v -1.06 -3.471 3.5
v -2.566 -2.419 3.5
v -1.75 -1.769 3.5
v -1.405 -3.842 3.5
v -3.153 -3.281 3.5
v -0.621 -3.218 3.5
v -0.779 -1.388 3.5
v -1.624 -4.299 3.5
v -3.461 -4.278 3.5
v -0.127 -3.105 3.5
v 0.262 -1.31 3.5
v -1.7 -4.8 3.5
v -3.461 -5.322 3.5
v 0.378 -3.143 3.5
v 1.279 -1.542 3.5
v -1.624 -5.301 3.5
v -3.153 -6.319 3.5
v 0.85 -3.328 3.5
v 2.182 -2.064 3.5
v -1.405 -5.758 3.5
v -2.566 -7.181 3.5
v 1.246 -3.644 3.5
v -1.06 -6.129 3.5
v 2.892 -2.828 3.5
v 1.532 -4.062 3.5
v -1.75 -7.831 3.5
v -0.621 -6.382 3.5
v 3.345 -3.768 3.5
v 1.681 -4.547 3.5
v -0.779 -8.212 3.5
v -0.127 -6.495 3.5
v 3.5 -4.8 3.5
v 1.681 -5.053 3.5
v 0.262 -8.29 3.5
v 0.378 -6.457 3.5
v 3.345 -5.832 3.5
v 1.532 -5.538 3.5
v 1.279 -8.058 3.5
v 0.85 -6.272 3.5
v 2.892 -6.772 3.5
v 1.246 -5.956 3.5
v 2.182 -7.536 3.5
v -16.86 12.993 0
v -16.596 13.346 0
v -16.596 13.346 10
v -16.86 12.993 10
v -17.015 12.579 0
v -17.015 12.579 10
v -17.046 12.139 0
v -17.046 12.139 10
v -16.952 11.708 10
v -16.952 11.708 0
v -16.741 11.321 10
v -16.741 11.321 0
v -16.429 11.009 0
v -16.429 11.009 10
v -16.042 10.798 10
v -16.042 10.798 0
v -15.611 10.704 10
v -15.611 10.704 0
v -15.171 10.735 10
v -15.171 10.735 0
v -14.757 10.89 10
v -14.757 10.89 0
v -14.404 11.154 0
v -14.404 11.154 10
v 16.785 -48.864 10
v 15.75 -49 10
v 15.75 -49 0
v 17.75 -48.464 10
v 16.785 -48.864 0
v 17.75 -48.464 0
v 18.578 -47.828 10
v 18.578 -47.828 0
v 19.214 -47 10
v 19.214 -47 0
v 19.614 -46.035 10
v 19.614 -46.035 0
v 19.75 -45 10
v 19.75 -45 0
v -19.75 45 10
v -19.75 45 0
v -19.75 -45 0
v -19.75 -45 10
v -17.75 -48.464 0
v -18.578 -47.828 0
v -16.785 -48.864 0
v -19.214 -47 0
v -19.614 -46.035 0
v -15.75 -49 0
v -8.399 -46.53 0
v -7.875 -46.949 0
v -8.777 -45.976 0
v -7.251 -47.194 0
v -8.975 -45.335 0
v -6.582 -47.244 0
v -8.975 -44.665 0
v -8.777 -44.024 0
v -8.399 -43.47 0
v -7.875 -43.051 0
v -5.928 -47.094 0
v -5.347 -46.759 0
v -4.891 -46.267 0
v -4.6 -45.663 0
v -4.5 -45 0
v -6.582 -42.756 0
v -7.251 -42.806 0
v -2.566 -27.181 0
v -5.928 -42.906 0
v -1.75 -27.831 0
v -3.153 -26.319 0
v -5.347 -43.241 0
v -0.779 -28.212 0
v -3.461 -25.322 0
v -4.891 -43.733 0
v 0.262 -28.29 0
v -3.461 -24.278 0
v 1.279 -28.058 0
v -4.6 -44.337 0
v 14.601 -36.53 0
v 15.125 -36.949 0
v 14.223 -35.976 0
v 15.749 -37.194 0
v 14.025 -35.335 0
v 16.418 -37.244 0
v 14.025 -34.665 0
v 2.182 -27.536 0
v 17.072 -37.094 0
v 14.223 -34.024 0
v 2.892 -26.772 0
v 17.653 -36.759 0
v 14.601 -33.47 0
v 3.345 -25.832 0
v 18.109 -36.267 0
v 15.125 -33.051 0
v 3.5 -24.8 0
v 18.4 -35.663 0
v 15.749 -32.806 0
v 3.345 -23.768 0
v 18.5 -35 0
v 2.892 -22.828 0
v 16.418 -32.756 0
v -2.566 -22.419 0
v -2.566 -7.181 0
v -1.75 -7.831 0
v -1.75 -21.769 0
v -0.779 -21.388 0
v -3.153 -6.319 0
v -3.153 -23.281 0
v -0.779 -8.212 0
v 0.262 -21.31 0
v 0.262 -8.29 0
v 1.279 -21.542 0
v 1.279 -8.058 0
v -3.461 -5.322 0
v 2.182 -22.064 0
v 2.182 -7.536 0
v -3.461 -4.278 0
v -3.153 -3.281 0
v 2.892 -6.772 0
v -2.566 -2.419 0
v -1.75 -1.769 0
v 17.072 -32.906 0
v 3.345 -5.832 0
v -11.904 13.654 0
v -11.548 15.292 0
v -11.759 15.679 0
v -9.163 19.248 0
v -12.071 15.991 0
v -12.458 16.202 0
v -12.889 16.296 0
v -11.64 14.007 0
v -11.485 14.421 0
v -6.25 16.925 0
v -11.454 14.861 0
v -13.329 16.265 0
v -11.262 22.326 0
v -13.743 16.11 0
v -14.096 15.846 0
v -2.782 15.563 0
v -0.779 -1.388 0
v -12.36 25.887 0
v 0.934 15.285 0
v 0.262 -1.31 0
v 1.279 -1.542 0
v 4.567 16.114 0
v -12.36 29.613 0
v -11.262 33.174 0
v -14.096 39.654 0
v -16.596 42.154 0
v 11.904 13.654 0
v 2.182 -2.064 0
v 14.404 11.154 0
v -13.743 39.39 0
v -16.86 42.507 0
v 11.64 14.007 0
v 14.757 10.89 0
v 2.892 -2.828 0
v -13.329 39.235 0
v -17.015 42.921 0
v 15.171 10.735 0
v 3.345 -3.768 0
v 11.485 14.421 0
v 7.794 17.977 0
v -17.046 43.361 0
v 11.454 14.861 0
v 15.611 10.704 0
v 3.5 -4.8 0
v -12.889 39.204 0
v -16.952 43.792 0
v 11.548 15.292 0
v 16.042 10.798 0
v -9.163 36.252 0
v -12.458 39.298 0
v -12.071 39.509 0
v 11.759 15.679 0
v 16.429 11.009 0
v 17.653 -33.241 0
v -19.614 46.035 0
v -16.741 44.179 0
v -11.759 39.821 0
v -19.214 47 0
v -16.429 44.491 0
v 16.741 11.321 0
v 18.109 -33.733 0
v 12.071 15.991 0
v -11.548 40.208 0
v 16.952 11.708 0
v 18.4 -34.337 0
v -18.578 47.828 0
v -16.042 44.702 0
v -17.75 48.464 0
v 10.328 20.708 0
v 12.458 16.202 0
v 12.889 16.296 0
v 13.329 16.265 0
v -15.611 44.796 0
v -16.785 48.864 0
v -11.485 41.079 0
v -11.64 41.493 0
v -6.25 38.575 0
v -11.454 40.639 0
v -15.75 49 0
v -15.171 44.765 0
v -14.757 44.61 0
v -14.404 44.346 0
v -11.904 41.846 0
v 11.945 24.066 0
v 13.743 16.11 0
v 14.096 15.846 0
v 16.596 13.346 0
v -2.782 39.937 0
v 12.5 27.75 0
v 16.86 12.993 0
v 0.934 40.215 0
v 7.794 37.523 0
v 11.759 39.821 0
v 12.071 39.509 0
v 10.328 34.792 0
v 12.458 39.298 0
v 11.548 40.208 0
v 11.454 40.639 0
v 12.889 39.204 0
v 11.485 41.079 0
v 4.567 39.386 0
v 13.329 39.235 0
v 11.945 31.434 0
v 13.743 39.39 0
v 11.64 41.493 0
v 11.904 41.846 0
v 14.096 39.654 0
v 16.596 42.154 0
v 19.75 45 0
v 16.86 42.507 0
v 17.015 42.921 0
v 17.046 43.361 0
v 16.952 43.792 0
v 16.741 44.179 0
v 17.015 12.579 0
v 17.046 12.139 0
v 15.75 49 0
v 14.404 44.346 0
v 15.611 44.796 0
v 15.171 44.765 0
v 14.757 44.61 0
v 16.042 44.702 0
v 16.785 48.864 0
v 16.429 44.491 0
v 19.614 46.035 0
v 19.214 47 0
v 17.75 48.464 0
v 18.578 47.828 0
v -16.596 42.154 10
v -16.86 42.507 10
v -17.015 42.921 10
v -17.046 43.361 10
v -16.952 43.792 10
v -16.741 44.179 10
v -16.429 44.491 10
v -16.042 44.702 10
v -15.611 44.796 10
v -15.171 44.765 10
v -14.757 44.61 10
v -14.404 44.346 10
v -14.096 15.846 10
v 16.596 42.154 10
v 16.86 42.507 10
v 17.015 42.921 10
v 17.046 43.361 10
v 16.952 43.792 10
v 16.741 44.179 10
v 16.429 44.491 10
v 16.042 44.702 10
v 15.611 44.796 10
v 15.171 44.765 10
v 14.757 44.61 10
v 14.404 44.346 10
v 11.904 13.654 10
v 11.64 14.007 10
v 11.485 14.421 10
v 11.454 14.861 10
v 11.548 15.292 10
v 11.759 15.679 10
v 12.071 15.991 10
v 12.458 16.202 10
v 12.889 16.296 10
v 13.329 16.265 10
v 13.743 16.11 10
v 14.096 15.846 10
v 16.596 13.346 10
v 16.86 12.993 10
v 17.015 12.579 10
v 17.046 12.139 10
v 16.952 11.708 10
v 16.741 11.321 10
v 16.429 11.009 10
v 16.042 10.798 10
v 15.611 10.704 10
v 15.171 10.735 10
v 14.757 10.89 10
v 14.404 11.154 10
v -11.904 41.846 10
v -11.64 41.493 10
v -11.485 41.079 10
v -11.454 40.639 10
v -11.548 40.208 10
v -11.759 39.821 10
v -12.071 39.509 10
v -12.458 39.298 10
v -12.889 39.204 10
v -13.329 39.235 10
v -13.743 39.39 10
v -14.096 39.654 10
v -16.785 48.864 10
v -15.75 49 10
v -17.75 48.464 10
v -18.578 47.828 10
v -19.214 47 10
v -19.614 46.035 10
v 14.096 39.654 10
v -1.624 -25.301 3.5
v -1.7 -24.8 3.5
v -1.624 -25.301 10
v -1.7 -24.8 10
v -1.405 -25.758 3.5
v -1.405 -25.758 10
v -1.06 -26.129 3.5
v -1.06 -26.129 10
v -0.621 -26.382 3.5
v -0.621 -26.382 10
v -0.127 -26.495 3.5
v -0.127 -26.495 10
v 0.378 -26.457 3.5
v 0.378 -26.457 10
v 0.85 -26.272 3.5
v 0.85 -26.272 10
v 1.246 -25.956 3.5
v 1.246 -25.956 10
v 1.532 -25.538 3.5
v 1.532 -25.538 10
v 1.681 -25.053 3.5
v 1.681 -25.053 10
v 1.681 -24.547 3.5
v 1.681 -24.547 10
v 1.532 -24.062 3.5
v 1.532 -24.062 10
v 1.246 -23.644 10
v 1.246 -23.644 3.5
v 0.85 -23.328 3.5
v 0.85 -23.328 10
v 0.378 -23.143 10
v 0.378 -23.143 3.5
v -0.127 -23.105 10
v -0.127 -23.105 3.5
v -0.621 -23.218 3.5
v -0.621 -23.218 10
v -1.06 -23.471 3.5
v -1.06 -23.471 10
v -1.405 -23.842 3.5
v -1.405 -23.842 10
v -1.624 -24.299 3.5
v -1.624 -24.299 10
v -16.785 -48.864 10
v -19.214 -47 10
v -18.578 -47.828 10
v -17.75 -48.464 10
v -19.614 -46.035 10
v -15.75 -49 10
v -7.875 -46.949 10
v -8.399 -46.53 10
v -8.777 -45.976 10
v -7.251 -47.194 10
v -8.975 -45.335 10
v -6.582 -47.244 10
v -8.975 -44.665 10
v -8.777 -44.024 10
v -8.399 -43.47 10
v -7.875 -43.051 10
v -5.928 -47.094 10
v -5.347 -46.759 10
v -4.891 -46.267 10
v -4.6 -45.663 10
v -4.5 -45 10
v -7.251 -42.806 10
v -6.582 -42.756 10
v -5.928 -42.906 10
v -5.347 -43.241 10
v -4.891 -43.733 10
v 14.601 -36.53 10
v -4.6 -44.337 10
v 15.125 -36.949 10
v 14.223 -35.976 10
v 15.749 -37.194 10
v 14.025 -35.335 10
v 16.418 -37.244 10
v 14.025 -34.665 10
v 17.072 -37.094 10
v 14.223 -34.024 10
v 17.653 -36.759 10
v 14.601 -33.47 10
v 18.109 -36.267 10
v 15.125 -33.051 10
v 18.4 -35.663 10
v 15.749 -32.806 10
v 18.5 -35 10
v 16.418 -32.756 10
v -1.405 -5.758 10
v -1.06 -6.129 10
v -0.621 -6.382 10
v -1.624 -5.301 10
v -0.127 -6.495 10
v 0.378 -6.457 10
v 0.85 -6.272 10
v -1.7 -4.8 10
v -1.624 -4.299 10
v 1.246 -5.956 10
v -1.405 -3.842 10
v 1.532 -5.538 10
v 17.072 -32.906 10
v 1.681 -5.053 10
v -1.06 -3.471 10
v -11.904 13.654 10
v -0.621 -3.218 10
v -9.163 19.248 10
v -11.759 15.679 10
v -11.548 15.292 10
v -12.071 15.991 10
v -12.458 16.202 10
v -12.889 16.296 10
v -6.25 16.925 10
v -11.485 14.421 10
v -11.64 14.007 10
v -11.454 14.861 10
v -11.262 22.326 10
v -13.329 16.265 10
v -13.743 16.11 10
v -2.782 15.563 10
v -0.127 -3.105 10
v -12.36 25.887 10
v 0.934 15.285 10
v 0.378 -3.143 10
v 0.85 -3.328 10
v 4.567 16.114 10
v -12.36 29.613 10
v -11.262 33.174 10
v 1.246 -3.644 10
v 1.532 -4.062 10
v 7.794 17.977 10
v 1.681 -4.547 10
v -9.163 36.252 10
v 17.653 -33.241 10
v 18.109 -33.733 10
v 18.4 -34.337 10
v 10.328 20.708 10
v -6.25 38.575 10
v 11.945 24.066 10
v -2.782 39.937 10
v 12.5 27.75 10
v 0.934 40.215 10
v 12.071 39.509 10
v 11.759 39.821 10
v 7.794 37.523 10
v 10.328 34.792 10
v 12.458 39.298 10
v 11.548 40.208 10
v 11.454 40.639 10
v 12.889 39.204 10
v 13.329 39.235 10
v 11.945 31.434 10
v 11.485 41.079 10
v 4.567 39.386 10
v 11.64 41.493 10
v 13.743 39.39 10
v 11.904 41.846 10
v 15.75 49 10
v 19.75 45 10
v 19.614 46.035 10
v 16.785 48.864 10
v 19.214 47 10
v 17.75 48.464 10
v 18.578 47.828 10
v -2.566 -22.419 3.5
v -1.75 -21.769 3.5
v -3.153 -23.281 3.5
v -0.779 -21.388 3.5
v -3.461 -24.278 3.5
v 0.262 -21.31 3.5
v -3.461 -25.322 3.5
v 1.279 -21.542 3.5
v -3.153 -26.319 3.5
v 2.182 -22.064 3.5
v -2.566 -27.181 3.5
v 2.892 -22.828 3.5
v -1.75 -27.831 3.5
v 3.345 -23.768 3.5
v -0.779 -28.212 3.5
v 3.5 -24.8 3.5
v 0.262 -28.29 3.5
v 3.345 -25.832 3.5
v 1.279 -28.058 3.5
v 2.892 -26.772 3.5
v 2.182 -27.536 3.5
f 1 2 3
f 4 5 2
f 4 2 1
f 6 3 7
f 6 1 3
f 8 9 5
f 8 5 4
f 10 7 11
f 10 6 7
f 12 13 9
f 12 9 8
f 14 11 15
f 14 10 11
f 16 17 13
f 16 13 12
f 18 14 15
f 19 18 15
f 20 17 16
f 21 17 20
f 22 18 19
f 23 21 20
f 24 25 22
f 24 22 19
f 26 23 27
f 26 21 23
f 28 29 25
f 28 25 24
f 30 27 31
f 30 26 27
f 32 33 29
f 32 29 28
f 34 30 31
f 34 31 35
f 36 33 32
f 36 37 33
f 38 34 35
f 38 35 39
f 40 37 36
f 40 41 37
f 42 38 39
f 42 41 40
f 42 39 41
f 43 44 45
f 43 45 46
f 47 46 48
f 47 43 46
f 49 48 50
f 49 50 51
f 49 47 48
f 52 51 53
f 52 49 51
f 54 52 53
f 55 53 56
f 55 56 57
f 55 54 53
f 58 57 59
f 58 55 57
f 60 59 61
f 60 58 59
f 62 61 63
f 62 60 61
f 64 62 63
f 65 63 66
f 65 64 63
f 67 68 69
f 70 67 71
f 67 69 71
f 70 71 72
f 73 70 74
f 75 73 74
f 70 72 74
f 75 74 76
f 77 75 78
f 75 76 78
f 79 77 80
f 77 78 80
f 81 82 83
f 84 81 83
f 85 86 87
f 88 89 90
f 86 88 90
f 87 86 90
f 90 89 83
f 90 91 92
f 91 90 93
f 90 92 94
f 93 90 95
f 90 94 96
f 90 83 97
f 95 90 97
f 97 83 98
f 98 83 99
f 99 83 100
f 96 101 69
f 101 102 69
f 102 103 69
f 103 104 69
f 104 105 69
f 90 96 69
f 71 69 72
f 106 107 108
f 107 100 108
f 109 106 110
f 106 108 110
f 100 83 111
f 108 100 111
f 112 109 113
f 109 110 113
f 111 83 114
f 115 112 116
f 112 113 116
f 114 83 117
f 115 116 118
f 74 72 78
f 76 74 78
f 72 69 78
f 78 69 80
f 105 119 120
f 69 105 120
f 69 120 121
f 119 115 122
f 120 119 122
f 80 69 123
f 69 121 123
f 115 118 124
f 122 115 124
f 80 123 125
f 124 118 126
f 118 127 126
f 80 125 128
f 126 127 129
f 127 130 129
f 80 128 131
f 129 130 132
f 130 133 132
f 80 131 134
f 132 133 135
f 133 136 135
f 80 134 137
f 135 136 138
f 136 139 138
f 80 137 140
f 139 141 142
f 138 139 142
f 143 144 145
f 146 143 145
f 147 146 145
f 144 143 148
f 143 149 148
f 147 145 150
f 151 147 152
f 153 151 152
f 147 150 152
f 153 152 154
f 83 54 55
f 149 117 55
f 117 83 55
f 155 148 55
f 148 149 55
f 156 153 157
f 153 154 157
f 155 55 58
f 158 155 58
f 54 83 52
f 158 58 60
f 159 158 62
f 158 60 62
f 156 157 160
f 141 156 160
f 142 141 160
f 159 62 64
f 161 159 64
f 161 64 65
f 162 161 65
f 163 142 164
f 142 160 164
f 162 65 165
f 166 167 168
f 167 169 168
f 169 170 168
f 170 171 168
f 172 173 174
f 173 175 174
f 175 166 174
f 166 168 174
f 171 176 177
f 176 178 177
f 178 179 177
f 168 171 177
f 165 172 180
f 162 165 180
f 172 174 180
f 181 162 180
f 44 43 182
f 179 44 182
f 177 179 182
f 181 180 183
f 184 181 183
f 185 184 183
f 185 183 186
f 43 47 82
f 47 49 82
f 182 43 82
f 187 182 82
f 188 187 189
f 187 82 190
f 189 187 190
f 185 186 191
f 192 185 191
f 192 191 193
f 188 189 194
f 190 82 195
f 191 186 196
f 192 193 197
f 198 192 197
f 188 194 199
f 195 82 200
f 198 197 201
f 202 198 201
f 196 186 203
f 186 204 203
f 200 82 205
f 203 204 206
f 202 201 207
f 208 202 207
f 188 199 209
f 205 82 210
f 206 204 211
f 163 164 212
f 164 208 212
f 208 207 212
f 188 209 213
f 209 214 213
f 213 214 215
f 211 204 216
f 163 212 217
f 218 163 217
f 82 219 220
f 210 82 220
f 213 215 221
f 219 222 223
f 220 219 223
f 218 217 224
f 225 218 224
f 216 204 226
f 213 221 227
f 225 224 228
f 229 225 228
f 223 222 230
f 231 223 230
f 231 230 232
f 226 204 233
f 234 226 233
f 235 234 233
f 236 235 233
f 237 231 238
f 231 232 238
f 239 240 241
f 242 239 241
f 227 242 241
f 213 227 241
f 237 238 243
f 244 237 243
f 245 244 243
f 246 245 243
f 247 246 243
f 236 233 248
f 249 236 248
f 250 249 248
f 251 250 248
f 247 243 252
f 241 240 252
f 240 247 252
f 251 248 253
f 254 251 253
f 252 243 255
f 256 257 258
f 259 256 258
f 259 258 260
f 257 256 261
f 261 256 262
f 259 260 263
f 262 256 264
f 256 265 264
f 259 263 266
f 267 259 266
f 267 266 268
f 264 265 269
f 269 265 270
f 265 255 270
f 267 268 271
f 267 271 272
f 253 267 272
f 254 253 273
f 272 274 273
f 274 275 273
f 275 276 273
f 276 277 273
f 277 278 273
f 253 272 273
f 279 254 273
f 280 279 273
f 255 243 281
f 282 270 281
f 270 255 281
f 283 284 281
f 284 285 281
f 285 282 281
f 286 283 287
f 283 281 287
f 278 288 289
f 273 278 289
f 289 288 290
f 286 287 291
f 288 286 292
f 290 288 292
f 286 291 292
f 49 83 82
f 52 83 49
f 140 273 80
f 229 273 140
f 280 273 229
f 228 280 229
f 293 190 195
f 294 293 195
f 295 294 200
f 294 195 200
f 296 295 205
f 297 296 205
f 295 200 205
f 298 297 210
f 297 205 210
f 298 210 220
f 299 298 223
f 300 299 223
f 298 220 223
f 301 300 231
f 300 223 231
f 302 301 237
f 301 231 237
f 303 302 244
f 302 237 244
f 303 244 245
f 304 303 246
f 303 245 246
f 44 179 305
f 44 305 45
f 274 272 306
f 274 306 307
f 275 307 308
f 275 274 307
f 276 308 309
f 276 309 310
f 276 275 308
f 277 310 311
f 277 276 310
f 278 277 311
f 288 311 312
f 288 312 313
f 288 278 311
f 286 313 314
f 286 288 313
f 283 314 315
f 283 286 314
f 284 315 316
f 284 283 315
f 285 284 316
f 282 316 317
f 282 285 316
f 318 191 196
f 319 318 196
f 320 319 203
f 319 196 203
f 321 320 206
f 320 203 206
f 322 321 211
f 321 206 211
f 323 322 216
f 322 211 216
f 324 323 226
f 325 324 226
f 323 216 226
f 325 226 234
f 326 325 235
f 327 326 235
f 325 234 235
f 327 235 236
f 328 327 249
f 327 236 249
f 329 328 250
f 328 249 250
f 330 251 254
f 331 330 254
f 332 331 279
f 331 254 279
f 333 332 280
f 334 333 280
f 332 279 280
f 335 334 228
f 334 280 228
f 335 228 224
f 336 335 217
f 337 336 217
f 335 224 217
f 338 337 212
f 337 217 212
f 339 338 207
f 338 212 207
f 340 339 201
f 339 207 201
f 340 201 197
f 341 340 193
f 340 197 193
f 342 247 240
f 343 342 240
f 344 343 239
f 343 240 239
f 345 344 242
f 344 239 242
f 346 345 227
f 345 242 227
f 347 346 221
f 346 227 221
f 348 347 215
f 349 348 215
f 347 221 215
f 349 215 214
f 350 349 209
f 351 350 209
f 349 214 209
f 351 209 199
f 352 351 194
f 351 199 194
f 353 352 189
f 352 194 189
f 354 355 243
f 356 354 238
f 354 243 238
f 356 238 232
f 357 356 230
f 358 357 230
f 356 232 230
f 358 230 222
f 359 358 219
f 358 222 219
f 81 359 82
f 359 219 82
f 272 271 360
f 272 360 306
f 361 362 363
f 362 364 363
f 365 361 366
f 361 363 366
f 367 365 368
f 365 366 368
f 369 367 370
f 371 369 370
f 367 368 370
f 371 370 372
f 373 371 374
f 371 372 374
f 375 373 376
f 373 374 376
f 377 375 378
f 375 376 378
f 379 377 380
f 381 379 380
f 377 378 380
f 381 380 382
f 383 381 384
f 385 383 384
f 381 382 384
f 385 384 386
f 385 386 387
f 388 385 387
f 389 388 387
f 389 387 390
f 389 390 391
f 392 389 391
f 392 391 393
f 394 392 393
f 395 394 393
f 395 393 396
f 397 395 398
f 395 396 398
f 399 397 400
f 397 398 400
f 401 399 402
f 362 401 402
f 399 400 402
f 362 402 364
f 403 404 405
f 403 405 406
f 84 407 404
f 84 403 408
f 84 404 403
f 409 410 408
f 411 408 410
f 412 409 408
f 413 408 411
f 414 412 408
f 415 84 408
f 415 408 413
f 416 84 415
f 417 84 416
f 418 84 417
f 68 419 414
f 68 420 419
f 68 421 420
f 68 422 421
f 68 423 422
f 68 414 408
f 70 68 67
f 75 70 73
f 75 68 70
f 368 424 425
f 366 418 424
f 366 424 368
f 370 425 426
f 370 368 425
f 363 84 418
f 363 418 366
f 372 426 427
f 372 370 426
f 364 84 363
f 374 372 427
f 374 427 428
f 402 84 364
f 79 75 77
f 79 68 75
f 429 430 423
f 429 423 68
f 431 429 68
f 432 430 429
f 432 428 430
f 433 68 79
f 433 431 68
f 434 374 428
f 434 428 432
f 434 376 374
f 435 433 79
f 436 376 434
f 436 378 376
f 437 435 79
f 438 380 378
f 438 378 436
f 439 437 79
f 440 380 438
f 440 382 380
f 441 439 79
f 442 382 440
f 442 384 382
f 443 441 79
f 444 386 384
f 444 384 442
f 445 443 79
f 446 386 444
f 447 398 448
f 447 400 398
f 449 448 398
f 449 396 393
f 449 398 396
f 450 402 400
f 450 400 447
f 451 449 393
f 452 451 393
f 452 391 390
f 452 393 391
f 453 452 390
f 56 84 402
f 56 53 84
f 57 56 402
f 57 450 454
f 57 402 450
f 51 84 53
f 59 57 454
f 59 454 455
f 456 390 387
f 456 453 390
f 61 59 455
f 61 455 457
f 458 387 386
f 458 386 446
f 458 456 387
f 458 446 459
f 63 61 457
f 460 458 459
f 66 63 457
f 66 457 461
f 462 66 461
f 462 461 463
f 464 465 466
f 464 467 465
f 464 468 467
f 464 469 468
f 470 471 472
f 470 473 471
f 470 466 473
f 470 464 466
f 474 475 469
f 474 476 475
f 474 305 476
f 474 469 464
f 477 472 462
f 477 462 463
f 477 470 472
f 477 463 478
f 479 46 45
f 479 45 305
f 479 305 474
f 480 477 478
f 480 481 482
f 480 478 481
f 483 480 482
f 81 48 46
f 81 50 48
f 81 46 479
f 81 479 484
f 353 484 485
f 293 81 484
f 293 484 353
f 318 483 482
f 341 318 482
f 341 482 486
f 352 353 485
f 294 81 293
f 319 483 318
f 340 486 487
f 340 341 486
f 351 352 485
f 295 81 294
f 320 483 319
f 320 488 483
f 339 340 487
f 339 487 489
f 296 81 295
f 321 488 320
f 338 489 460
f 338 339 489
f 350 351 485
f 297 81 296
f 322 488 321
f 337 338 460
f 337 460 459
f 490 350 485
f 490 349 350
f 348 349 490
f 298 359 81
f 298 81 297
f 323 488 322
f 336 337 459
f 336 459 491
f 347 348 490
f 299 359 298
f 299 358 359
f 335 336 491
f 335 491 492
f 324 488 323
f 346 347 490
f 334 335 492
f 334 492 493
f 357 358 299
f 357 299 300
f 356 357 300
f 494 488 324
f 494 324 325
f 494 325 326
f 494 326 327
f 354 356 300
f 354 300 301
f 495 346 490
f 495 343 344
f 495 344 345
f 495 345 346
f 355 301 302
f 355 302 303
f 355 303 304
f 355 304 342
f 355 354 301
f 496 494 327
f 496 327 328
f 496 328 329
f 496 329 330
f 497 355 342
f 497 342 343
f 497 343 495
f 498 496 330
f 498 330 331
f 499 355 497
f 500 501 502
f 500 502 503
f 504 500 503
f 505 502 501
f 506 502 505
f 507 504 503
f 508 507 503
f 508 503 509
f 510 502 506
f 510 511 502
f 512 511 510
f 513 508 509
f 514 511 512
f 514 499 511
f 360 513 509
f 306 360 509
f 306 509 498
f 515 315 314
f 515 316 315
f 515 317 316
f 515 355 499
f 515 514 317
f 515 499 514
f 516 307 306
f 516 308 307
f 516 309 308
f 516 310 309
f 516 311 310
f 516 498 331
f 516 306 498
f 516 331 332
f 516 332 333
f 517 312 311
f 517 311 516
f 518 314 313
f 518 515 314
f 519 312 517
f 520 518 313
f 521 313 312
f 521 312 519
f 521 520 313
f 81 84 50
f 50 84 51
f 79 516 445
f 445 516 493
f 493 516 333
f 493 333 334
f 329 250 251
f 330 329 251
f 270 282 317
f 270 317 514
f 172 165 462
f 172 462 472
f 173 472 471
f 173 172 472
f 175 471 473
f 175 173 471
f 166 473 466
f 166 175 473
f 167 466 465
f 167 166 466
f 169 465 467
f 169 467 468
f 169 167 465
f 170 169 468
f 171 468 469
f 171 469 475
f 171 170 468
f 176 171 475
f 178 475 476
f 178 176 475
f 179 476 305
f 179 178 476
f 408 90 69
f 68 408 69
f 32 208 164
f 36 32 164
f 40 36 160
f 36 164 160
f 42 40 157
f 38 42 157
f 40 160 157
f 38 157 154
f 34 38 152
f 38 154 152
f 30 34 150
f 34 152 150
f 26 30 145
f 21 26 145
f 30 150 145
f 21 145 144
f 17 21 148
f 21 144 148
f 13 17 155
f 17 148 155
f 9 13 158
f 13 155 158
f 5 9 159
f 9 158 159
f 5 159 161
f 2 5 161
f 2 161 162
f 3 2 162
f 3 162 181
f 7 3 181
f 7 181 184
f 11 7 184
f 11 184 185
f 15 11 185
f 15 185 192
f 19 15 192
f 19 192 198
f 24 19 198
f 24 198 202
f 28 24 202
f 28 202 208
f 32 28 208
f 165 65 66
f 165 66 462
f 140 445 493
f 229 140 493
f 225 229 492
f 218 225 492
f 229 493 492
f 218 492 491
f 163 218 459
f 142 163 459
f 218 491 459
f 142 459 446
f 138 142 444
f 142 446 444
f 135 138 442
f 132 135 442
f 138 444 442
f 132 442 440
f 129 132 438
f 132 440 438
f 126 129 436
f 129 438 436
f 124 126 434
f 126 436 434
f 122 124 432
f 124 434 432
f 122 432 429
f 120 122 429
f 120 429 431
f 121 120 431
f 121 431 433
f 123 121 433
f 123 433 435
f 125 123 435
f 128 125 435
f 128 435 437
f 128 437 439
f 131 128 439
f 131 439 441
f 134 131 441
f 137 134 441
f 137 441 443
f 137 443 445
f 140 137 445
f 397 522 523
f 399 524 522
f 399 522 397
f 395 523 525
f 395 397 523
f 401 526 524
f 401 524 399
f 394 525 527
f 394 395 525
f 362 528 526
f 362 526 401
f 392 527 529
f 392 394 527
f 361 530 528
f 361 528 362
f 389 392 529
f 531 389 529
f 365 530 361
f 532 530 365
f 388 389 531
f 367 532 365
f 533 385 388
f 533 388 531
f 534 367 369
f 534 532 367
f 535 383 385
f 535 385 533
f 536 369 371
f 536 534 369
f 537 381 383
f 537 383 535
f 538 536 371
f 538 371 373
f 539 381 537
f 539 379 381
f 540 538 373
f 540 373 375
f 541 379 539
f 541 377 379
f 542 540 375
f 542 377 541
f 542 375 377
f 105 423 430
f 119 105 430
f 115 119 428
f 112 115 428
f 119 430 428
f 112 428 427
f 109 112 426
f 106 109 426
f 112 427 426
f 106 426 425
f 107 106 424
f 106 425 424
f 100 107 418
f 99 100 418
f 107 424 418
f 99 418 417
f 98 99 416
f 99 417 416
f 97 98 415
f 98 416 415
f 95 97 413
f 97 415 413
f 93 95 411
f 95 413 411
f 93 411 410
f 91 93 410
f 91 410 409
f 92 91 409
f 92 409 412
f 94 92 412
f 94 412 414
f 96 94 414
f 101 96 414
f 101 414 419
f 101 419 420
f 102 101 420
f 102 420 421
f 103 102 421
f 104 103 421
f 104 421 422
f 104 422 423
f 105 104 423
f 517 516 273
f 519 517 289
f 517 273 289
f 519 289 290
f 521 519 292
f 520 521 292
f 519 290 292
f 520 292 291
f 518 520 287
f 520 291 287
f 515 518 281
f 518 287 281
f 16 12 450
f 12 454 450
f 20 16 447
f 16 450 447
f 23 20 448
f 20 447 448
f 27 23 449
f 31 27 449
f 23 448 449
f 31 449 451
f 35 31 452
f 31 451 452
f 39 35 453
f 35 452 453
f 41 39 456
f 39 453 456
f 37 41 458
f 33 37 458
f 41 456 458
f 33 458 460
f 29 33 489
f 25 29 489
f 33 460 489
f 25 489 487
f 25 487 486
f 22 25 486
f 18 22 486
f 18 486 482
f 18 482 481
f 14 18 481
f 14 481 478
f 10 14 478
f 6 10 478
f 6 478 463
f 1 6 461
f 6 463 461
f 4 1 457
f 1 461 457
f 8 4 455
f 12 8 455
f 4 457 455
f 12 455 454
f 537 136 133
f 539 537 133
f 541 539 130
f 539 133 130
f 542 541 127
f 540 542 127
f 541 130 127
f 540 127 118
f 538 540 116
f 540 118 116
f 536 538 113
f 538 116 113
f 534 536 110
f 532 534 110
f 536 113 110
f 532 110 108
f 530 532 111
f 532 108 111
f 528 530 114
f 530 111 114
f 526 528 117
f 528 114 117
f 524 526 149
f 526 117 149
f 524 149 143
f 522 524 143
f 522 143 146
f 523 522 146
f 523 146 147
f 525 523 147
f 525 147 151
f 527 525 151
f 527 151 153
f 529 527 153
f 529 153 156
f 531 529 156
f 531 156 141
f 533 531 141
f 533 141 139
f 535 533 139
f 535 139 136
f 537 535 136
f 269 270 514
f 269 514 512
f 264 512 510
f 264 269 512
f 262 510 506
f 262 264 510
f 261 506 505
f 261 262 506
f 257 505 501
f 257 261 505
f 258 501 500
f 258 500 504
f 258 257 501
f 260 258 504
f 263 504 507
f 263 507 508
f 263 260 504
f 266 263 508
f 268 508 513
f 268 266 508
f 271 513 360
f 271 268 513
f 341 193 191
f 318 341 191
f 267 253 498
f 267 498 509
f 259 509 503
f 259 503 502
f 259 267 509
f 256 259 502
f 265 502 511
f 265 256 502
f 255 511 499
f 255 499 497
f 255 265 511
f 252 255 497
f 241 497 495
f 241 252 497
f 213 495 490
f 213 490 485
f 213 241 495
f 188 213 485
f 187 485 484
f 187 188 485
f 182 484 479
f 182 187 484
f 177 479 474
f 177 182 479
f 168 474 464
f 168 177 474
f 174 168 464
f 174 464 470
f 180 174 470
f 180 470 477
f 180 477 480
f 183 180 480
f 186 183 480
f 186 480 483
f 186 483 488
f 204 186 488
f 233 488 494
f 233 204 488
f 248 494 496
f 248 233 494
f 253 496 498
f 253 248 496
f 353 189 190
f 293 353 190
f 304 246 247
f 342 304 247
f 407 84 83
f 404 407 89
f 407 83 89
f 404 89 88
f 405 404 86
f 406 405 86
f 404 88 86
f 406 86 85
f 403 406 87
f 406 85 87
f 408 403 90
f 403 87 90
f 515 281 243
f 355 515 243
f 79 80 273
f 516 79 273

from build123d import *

# Parameters (mm, degrees)
SKETCH1_R                                          = 2.55
SKETCH1_R_2                                        = 12.5
BOSS_EXTRUDE1_DEPTH                                = 10
CHAMBRAGE_POUR_VIS_T_TE_RONDE_BOMB_E_M_D           = 3.4
CHAMBRAGE_POUR_VIS_T_TE_RONDE_BOMB_E_M_CBORE_D     = 7
CHAMBRAGE_POUR_VIS_T_TE_RONDE_BOMB_E_M_CBORE_DEPTH = 3.5
DIAM_TRE_DU_PER_AGE_4_5_4_5_1_D                    = 4.5


with BuildPart() as part:
    # Sketch1 → Boss-Extrude1 (new body)
    # profile 1 of 3: a face of its own
    with BuildSketch(Plane.XY):
        with BuildLine():
            Line((15.75, 49), (-15.75, 49))
            ThreePointArc((-15.75, 49), (-18.578427125, 47.828427125), (-19.75, 45))
            Line((-19.75, 45), (-19.75, -45))
            ThreePointArc((-19.75, -45), (-18.578427125, -47.828427125), (-15.75, -49))
            Line((-15.75, -49), (15.75, -49))
            ThreePointArc((15.75, -49), (18.578427125, -47.828427125), (19.75, -45))
            Line((19.75, -45), (19.75, 45))
            ThreePointArc((19.75, 45), (18.578427125, 47.828427125), (15.75, 49))
        make_face()
        with Locations((0, -4.8)):
            Circle(SKETCH1_R, mode=Mode.SUBTRACT)
        with Locations((0, -24.8)):
            Circle(SKETCH1_R, mode=Mode.SUBTRACT)
        with Locations((0, 27.75)):
            Circle(SKETCH1_R_2, mode=Mode.SUBTRACT)
        with BuildLine():
            ThreePointArc((-16.596015511, 13.346015511), (-16.596015511, 11.153984489), (-14.403984489, 11.153984489))
            Line((-14.403984489, 11.153984489), (-11.903984489, 13.653984489))
            ThreePointArc((-11.903984489, 13.653984489), (-11.903984489, 15.846015511), (-14.096015511, 15.846015511))
            Line((-14.096015511, 15.846015511), (-16.596015511, 13.346015511))
        make_face(mode=Mode.SUBTRACT)
        with BuildLine():
            ThreePointArc((16.596015511, 42.153984489), (16.596015511, 44.346015511), (14.403984489, 44.346015511))
            Line((14.403984489, 44.346015511), (11.903984489, 41.846015511))
            ThreePointArc((11.903984489, 41.846015511), (11.903984489, 39.653984489), (14.096015511, 39.653984489))
            Line((14.096015511, 39.653984489), (16.596015511, 42.153984489))
        make_face(mode=Mode.SUBTRACT)
        with BuildLine():
            Line((-14.096015511, 39.653984489), (-16.596015511, 42.153984489))
            ThreePointArc((-16.596015511, 42.153984489), (-16.596015511, 44.346015511), (-14.403984489, 44.346015511))
            Line((-14.403984489, 44.346015511), (-11.903984489, 41.846015511))
            ThreePointArc((-11.903984489, 41.846015511), (-11.903984489, 39.653984489), (-14.096015511, 39.653984489))
        make_face(mode=Mode.SUBTRACT)
        with BuildLine():
            Line((14.096015511, 15.846015511), (16.596015511, 13.346015511))
            ThreePointArc((16.596015511, 13.346015511), (16.596015511, 11.153984489), (14.403984489, 11.153984489))
            Line((14.403984489, 11.153984489), (11.903984489, 13.653984489))
            ThreePointArc((11.903984489, 13.653984489), (11.903984489, 15.846015511), (14.096015511, 15.846015511))
        make_face(mode=Mode.SUBTRACT)
    # profile 2 of 3: a face of its own
    with BuildSketch(Plane.XY):
        with Locations((0, -24.8)):
            Circle(SKETCH1_R)
    # profile 3 of 3: a face of its own
    with BuildSketch(Plane.XY):
        with Locations((0, -4.8)):
            Circle(SKETCH1_R)
    extrude(amount=BOSS_EXTRUDE1_DEPTH)

    # Chambrage pour vis à tête ronde bombée M31 (through all)
    with Locations(Plane(origin=(0, 0, 0), x_dir=(1, 0, 0), z_dir=(0, 0, -1))):
        with Locations((0, 4.8), (0, 24.8)):
            CounterBoreHole(CHAMBRAGE_POUR_VIS_T_TE_RONDE_BOMB_E_M_D / 2, CHAMBRAGE_POUR_VIS_T_TE_RONDE_BOMB_E_M_CBORE_D / 2, CHAMBRAGE_POUR_VIS_T_TE_RONDE_BOMB_E_M_CBORE_DEPTH)

    # Diamètre du perçage Ø4.5 (4.5)1 (through all)
    with Locations(Plane(origin=(0, 0, 0), x_dir=(-1, 0, 0), z_dir=(0, 0, -1))):
        with Locations((-16.25, -35), (6.75, -45)):
            Hole(DIAM_TRE_DU_PER_AGE_4_5_4_5_1_D / 2)


solid = part.part
